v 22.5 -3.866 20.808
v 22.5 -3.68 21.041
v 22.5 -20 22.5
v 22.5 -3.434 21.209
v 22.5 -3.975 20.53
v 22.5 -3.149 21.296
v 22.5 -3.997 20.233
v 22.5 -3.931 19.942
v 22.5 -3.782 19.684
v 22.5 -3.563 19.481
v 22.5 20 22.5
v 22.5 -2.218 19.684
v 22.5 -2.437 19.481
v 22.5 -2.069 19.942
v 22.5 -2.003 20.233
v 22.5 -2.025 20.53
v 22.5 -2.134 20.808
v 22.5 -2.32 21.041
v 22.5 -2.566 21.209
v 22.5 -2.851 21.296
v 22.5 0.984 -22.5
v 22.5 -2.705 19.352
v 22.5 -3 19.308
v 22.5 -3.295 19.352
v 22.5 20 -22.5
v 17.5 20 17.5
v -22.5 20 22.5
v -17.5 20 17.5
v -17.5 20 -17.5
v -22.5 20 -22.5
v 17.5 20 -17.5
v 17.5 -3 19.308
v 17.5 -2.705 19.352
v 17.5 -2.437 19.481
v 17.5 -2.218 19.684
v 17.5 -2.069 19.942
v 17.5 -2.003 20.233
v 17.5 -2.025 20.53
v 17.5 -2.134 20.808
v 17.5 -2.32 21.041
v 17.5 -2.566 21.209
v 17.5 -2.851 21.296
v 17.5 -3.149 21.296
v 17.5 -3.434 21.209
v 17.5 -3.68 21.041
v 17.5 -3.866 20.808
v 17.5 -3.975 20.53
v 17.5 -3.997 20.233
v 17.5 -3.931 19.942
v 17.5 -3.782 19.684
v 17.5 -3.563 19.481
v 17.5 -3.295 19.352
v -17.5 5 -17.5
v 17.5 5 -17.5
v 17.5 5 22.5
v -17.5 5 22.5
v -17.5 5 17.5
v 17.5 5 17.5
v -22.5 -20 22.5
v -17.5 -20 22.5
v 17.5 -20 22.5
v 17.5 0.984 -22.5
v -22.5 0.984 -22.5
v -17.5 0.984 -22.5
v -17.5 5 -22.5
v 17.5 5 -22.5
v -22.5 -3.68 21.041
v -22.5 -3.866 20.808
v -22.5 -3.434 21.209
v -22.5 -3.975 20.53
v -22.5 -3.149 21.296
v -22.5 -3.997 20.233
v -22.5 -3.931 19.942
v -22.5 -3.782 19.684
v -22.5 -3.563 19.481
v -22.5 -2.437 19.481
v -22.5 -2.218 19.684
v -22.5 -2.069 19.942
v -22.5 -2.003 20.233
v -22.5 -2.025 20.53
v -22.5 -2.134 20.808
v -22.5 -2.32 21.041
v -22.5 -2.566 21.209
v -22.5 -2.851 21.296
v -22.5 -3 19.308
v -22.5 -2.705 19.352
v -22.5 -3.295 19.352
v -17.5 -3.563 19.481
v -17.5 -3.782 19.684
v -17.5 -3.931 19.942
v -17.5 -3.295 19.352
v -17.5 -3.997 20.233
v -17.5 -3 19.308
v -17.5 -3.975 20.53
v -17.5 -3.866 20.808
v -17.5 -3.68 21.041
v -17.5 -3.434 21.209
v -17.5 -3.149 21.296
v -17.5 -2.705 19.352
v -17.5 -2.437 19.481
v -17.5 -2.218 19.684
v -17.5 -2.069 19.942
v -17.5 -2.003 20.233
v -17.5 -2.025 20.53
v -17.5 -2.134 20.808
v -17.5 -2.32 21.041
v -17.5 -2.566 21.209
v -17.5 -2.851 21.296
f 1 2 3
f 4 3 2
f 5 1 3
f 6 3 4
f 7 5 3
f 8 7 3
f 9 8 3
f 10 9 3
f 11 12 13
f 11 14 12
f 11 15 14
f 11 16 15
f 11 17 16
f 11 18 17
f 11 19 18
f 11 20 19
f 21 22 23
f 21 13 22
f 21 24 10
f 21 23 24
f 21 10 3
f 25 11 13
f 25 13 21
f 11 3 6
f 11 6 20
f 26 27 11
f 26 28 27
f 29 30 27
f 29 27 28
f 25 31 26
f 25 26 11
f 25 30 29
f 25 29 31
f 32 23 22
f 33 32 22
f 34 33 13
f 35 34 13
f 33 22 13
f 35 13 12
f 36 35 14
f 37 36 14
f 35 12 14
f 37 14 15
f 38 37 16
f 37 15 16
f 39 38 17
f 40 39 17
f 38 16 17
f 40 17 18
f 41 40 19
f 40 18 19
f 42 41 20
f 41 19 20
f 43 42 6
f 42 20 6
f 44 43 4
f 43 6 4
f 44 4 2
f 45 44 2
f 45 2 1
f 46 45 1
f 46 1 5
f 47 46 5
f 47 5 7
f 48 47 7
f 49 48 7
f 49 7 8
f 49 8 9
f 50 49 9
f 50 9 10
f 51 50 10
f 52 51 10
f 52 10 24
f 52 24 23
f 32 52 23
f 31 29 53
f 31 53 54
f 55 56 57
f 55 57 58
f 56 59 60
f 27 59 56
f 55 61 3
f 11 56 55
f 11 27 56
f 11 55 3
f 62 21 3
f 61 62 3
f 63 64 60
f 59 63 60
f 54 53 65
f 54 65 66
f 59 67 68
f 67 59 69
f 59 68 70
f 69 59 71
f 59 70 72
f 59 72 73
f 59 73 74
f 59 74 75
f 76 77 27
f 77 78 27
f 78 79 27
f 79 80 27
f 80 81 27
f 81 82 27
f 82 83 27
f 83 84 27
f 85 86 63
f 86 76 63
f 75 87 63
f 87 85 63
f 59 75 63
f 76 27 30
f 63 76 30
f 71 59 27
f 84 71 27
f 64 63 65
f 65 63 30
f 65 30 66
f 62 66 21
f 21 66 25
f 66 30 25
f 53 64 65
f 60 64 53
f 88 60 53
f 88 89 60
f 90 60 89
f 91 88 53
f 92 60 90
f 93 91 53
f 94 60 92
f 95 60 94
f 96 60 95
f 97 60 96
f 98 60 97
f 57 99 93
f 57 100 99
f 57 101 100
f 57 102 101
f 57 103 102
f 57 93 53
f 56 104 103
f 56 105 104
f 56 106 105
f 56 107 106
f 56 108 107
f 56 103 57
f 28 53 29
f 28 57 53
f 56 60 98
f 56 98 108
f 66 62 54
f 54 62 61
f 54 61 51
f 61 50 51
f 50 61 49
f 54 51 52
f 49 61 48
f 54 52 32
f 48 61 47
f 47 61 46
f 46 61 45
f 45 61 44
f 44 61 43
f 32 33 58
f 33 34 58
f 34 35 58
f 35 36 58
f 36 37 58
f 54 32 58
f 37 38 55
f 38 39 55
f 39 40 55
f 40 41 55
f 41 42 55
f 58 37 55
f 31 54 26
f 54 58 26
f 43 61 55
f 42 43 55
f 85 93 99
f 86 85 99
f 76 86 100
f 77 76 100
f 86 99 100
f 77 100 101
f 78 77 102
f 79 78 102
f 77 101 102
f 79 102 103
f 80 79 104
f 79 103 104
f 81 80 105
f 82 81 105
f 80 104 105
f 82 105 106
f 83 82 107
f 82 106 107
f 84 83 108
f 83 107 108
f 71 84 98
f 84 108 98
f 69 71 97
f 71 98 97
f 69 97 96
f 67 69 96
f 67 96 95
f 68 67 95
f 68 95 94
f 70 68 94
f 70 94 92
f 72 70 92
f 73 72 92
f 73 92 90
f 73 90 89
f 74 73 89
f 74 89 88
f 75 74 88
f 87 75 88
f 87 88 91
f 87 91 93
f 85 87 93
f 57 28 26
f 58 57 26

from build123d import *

# Parameters (mm, degrees)
CROQUIS1_W              = 45
CROQUIS1_H              = 45
CROQUIS1_W_2            = 35
CROQUIS1_H_2            = 35
SALIENTE_EXTRUIR1_DEPTH = 20
CORTAR_EXTRUIR1_DEPTH   = 46
CROQUIS6_W              = 35
CROQUIS6_H              = 25
CORTAR_EXTRUIR2_DEPTH   = 46
CROQUIS7_R              = 1
CORTAR_EXTRUIR3_DEPTH   = 46


with BuildPart() as part:
    # Croquis1 → Saliente-Extruir1 (new body, symmetric)
    with BuildSketch(Plane(origin=(0, 0, 0), x_dir=(1, 0, 0), z_dir=(0, 1, 0))):
        Rectangle(CROQUIS1_W, CROQUIS1_H)
        Rectangle(CROQUIS1_W_2, CROQUIS1_H_2, mode=Mode.SUBTRACT)
    extrude(amount=SALIENTE_EXTRUIR1_DEPTH, both=True)

    # Croquis3 → Cortar-Extruir1 (cut, through all)
    with BuildSketch(Plane(origin=(22.5, 0, 0), x_dir=(0, 0, -1), z_dir=(1, 0, 0))):
        Polygon((-22.5, -20), (22.5, -20), (22.5, 0.983844617), align=None)
    extrude(amount=-CORTAR_EXTRUIR1_DEPTH, mode=Mode.SUBTRACT)

    # Croquis6 → Cortar-Extruir2 (cut, through all)
    with BuildSketch(Plane.XY.offset(22.5)):
        with Locations((0, -7.5)):
            Rectangle(CROQUIS6_W, CROQUIS6_H)
    extrude(amount=-CORTAR_EXTRUIR2_DEPTH, mode=Mode.SUBTRACT)

    # Croquis7 → Cortar-Extruir3 (cut, through all)
    with BuildSketch(Plane(origin=(22.5, 0, 0), x_dir=(0, 0, -1), z_dir=(1, 0, 0))):
        with Locations((-20.307584971, -3)):
            Circle(CROQUIS7_R)
    extrude(amount=-CORTAR_EXTRUIR3_DEPTH, mode=Mode.SUBTRACT)


solid = part.part
